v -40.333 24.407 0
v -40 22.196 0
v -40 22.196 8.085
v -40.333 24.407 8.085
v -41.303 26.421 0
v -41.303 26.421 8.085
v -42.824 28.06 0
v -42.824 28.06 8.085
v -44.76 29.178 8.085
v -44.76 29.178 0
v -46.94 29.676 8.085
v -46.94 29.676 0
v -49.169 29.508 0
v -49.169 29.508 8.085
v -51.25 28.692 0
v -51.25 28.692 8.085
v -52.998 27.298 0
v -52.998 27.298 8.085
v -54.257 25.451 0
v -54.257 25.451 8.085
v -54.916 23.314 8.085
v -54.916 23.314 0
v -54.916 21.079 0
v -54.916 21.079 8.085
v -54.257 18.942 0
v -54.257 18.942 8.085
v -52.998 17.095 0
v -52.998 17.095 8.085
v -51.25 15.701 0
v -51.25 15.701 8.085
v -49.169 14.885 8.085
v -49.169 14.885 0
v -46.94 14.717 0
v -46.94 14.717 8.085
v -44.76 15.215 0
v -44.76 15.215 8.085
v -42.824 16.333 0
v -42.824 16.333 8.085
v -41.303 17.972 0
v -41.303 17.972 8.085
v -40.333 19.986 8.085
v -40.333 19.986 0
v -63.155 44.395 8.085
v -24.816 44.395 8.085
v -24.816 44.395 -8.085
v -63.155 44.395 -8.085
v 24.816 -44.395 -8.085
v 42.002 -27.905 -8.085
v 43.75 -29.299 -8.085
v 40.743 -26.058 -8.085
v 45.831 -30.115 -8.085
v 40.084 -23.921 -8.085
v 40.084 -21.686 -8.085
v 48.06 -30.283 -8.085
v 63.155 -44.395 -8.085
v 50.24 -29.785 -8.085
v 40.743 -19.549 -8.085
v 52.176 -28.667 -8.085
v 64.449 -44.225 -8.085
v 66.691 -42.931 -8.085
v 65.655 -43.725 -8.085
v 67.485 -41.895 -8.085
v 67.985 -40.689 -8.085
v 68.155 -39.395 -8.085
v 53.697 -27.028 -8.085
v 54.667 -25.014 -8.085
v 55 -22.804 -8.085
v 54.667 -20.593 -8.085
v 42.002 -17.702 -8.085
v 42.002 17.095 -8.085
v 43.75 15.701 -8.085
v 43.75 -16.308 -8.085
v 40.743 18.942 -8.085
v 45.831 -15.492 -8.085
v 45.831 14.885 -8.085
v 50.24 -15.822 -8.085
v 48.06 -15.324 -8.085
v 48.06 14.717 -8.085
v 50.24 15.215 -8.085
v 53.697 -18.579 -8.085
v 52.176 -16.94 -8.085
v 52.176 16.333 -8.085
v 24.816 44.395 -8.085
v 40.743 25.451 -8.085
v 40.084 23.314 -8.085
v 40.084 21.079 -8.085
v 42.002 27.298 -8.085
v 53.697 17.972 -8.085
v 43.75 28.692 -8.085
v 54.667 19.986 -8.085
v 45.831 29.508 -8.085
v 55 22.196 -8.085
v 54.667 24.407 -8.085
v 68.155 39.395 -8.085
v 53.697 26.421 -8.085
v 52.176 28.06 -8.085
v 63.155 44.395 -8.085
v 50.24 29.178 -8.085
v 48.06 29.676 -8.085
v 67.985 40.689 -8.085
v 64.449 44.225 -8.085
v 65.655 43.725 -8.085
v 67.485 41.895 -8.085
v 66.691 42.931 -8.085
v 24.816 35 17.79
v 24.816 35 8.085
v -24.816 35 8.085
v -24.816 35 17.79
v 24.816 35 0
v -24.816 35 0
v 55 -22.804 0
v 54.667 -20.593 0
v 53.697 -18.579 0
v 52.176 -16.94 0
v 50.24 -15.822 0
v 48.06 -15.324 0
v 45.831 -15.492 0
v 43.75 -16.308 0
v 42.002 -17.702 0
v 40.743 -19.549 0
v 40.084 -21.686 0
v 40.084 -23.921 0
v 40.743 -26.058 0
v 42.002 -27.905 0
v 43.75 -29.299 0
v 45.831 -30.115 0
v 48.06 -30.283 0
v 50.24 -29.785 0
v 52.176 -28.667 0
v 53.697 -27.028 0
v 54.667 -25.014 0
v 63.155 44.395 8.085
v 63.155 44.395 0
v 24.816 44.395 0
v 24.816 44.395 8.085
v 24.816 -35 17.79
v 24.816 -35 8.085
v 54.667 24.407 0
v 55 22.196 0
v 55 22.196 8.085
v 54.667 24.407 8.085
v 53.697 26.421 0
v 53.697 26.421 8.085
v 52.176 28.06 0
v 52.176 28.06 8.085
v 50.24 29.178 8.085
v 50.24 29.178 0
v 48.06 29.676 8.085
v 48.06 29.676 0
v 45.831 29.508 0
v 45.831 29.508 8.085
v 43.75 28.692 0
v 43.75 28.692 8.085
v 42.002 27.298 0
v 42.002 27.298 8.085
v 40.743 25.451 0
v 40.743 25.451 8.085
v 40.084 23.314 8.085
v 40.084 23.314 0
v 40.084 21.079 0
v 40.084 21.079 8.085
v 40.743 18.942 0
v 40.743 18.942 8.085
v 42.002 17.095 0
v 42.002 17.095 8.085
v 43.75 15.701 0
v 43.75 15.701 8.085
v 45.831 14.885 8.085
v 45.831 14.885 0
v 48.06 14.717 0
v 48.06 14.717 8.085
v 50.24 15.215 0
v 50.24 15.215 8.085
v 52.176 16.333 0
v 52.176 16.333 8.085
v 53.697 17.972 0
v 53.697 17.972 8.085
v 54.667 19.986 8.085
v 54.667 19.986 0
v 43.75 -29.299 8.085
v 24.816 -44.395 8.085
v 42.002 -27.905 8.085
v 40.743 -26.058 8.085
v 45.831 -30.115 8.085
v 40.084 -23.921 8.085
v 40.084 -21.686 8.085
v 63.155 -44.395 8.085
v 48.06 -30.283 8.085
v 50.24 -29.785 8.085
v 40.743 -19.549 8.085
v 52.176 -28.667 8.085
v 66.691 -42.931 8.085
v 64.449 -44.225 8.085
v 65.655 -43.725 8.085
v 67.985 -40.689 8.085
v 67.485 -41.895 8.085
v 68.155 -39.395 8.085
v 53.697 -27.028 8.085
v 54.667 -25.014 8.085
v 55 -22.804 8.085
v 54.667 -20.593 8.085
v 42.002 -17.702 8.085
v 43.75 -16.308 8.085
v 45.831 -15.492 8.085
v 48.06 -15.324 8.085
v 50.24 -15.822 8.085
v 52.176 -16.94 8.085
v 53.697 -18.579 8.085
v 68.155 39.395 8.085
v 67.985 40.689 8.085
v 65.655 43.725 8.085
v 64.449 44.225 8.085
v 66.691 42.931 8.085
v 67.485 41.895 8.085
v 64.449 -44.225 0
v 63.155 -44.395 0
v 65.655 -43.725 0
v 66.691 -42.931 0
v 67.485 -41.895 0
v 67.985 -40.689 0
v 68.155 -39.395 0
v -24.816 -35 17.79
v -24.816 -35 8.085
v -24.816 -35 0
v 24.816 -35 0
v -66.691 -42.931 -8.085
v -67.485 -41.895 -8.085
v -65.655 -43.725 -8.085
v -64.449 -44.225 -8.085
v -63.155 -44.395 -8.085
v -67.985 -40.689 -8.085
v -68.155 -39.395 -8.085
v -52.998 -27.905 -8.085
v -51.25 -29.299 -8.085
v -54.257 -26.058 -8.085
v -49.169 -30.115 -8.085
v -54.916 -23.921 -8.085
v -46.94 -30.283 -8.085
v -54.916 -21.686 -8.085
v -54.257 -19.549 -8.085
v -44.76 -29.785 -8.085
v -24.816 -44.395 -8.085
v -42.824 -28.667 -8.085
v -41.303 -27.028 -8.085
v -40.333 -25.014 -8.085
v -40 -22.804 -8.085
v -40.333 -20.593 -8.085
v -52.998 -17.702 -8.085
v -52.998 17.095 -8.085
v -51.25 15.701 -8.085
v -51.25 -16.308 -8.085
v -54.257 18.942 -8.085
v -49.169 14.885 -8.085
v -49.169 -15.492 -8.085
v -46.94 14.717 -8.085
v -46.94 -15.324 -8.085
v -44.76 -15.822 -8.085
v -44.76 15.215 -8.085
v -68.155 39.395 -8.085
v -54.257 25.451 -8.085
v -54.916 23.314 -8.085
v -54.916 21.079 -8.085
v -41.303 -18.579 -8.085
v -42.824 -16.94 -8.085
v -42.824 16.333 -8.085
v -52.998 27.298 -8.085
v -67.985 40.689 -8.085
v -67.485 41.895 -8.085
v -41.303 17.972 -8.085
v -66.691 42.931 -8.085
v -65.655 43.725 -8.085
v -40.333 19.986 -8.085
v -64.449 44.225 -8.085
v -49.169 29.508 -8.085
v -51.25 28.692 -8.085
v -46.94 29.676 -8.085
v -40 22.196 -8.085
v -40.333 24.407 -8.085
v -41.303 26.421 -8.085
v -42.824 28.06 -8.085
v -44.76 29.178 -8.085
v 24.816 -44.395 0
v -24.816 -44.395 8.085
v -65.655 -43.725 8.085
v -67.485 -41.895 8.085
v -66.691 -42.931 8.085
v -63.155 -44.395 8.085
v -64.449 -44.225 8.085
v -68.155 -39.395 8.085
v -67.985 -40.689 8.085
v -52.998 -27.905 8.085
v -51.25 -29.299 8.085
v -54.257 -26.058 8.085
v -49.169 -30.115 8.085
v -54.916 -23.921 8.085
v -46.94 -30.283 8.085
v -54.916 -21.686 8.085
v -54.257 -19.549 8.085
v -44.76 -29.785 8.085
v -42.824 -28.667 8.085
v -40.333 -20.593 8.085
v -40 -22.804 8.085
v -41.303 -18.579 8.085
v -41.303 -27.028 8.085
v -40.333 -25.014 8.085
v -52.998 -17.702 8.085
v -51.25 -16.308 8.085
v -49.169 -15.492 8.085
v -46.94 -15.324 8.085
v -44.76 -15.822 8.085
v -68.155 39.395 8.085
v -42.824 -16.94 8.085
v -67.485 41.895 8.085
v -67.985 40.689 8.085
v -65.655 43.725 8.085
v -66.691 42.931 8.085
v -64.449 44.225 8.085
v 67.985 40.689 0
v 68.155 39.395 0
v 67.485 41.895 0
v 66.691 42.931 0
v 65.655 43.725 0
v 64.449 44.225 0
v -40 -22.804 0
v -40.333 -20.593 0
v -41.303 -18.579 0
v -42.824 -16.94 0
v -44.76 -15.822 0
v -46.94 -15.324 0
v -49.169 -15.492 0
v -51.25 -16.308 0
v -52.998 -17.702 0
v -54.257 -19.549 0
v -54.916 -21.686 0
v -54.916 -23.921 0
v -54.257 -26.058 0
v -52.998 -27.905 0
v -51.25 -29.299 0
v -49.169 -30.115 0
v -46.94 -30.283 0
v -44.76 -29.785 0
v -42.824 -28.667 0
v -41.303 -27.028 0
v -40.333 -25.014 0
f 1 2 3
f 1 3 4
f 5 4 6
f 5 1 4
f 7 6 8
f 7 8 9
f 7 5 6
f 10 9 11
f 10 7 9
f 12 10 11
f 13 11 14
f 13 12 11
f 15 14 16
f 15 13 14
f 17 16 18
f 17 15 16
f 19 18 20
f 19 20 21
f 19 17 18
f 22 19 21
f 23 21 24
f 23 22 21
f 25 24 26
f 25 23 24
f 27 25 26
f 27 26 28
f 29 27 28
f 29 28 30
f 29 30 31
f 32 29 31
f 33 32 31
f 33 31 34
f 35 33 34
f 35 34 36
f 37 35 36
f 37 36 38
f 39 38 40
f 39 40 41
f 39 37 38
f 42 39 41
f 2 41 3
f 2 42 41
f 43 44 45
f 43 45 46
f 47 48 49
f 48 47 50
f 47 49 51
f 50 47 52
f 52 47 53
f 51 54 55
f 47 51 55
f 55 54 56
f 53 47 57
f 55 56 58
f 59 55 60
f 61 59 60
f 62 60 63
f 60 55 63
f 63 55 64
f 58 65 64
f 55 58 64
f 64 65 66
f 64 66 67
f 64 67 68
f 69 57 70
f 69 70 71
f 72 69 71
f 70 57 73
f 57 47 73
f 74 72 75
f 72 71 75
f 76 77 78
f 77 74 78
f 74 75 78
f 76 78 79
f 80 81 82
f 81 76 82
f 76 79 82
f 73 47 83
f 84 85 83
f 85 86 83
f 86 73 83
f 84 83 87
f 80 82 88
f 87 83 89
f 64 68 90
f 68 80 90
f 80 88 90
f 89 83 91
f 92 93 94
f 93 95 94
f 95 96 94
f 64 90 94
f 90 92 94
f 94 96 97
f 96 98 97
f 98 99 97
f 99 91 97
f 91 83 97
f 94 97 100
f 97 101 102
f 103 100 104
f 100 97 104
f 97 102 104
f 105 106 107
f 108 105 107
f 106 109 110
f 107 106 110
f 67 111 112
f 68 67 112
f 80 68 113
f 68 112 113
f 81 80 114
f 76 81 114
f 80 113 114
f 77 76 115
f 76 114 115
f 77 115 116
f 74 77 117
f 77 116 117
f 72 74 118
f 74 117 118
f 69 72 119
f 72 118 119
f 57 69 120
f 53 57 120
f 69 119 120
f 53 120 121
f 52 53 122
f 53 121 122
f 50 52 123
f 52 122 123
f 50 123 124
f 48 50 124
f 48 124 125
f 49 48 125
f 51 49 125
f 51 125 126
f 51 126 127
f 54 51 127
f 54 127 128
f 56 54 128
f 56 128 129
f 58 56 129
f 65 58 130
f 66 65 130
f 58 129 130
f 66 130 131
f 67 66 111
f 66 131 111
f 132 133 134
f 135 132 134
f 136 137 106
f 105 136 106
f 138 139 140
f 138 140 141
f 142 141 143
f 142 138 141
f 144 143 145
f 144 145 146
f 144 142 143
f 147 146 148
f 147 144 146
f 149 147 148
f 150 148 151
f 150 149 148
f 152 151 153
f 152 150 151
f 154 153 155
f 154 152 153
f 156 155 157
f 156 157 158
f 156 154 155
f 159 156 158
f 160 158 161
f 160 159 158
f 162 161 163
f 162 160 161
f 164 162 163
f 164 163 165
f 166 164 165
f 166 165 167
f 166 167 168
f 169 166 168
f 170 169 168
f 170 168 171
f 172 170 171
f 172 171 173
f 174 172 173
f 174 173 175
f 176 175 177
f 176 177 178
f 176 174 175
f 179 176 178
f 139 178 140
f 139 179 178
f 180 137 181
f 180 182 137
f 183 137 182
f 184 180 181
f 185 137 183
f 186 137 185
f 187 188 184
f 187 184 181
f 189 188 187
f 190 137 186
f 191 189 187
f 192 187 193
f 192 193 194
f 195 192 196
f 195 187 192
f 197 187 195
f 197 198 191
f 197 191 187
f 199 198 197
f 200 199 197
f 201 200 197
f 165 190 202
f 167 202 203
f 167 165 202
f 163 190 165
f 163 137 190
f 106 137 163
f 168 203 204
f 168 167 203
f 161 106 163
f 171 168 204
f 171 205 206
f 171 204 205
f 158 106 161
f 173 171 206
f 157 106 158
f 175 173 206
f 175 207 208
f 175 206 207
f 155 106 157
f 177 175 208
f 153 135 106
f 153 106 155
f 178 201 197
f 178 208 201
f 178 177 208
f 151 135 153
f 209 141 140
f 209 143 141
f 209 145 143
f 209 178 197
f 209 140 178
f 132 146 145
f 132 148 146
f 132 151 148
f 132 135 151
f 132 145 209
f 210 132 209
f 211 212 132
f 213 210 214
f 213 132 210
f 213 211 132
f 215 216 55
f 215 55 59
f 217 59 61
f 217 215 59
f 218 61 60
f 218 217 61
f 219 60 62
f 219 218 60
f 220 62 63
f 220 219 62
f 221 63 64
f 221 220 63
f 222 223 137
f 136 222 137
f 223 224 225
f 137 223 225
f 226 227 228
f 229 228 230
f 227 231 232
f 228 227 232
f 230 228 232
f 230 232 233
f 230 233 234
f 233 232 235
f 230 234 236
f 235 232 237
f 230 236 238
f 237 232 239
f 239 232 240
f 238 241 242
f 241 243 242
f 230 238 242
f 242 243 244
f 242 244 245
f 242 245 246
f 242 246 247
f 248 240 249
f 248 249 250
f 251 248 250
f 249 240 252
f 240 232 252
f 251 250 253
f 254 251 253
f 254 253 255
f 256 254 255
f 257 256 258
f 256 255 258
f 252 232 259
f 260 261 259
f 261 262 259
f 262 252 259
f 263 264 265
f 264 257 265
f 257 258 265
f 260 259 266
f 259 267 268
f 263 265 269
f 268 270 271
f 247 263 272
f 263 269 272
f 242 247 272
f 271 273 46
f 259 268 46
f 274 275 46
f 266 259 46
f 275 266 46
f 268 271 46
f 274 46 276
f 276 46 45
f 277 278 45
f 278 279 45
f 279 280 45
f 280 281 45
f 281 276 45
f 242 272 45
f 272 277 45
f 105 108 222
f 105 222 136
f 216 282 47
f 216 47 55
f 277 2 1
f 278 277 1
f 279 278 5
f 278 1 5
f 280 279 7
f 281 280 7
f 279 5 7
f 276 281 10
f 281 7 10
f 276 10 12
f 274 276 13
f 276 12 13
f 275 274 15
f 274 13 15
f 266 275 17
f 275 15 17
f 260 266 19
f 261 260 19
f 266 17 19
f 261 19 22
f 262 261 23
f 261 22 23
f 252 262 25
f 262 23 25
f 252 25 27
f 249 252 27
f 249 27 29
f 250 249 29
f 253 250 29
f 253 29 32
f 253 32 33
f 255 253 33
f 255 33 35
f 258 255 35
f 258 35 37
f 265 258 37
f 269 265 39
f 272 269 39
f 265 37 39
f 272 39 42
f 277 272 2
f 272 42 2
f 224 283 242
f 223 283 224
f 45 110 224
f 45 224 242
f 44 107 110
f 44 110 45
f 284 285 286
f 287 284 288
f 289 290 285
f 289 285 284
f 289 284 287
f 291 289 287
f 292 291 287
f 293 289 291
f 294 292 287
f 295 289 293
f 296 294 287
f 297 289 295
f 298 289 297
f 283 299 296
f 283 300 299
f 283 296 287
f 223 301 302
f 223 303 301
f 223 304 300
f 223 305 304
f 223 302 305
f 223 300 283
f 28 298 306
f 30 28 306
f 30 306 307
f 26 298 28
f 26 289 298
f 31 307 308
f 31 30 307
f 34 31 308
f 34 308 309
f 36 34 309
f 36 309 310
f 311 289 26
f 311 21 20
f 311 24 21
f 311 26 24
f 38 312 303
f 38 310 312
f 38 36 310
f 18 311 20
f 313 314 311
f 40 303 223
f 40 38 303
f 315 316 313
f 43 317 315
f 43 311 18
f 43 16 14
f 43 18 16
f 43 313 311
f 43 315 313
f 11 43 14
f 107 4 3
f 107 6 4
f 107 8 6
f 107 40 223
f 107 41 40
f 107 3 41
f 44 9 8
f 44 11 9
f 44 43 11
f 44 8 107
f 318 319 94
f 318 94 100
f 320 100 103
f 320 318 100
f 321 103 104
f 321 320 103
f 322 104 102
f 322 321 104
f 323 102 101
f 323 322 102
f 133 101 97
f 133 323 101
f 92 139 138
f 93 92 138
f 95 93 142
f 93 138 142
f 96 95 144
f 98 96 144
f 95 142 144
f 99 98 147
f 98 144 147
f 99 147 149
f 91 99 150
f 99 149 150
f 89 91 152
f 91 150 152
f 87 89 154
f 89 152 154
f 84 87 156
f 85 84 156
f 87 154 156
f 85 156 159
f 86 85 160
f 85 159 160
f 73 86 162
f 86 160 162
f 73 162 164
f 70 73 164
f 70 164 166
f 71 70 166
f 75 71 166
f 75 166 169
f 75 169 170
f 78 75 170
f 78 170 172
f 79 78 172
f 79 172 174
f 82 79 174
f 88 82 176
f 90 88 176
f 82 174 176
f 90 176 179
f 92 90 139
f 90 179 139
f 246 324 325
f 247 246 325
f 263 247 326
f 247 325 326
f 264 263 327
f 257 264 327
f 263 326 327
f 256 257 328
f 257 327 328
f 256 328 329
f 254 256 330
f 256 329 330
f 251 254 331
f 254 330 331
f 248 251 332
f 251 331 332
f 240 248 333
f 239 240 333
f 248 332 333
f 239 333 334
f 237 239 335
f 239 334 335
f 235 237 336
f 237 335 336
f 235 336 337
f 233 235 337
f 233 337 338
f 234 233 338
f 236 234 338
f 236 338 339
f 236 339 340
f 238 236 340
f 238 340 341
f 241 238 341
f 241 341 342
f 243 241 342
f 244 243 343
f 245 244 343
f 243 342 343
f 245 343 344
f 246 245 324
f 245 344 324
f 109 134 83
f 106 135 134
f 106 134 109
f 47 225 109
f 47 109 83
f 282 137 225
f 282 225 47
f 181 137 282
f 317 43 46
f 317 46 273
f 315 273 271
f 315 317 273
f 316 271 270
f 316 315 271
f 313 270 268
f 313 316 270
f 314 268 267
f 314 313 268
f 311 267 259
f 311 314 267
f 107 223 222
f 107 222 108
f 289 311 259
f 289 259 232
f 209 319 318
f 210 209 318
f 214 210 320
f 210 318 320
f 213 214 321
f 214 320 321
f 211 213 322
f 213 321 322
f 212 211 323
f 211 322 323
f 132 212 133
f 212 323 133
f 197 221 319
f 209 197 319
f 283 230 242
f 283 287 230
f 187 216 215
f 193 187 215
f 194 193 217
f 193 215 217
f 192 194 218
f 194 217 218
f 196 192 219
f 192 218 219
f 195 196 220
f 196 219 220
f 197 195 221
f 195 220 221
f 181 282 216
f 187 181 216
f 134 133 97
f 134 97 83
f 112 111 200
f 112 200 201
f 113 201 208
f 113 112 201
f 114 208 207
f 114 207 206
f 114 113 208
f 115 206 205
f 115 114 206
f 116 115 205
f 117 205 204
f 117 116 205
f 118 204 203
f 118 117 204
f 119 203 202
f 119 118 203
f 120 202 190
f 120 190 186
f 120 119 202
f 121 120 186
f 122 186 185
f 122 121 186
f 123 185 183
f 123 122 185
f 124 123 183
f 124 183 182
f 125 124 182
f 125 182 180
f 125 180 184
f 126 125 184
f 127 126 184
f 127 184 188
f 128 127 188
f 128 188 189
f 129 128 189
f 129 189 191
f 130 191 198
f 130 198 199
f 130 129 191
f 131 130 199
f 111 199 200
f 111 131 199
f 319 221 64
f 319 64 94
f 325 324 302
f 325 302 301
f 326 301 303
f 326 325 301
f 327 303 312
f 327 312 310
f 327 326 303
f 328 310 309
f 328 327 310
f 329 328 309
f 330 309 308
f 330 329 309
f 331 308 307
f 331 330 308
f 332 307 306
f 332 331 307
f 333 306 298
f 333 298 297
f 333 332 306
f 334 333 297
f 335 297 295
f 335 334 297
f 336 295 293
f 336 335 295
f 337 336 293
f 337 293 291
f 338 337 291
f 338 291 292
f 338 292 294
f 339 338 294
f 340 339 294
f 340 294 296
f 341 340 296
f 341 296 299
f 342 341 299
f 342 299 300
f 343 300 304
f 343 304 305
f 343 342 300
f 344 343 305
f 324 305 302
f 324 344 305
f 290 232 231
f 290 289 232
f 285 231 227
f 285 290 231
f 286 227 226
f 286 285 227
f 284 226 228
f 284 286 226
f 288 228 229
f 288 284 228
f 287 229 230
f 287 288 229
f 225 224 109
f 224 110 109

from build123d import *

# Parameters (mm, degrees)
F0_W     = 24.8156127766
F0_H     = 70
F1_DEPTH = 17.79
F0_R     = 7.5
F2_DEPTH = 8.085
F3_DEPTH = 8.085


with BuildPart() as f1:
    # F0 (on Top) → F1 (new body)
    with BuildSketch(Plane.XY):
        with Locations((12.4078063883, 0)):
            Rectangle(F0_W, F0_H)
        with Locations((-12.4078063883, 0)):
            Rectangle(F0_W, F0_H)
    extrude(amount=F1_DEPTH)

    # F0 (on Top) → F2 (join)
    with BuildSketch(Plane.XY):
        with BuildLine():
            Line((24.8156127766, 35), (24.8156127766, -35))
            Line((24.8156127766, -35), (24.8156127766, -44.395))
            Line((24.8156127766, -44.395), (63.155, -44.395))
            ThreePointArc((63.155, -44.395), (66.6905339059, -42.9305339059), (68.155, -39.395))
            Line((68.155, -39.395), (68.155, 39.395))
            ThreePointArc((68.155, 39.395), (66.6905339059, 42.9305339059), (63.155, 44.395))
            Line((63.155, 44.395), (24.8156127766, 44.395))
            Line((24.8156127766, 44.395), (24.8156127766, 35))
        make_face()
        with Locations((47.5, -22.8035077453)):
            Circle(F0_R, mode=Mode.SUBTRACT)
        with Locations((47.5, 22.1964922547)):
            Circle(F0_R, mode=Mode.SUBTRACT)
        with BuildLine():
            Line((-24.8156127766, -44.395), (-24.8156127766, -35))
            Line((-24.8156127766, -35), (-24.8156127766, 35))
            Line((-24.8156127766, 35), (-24.8156127766, 44.395))
            Line((-24.8156127766, 44.395), (-63.155, 44.395))
            ThreePointArc((-63.155, 44.395), (-66.6905339059, 42.9305339059), (-68.155, 39.395))
            Line((-68.155, 39.395), (-68.155, -39.395))
            ThreePointArc((-68.155, -39.395), (-66.6905339059, -42.9305339059), (-63.155, -44.395))
            Line((-63.155, -44.395), (-24.8156127766, -44.395))
        make_face()
        with Locations((-47.5, -22.8035077453)):
            Circle(F0_R, mode=Mode.SUBTRACT)
        with Locations((-47.5, 22.1964922547)):
            Circle(F0_R, mode=Mode.SUBTRACT)
    extrude(amount=F2_DEPTH)

    # F0 (on Top) → F3 (join)
    with BuildSketch(Plane.XY):
        with BuildLine():
            Line((-24.8156127766, -44.395), (-24.8156127766, -35))
            Line((-24.8156127766, -35), (-24.8156127766, 35))
            Line((-24.8156127766, 35), (-24.8156127766, 44.395))
            Line((-24.8156127766, 44.395), (-63.155, 44.395))
            ThreePointArc((-63.155, 44.395), (-66.6905339059, 42.9305339059), (-68.155, 39.395))
            Line((-68.155, 39.395), (-68.155, -39.395))
            ThreePointArc((-68.155, -39.395), (-66.6905339059, -42.9305339059), (-63.155, -44.395))
            Line((-63.155, -44.395), (-24.8156127766, -44.395))
        make_face()
        with Locations((-47.5, -22.8035077453)):
            Circle(F0_R, mode=Mode.SUBTRACT)
        with Locations((-47.5, 22.1964922547)):
            Circle(F0_R, mode=Mode.SUBTRACT)
        with BuildLine():
            Line((24.8156127766, 35), (24.8156127766, -35))
            Line((24.8156127766, -35), (24.8156127766, -44.395))
            Line((24.8156127766, -44.395), (63.155, -44.395))
            ThreePointArc((63.155, -44.395), (66.6905339059, -42.9305339059), (68.155, -39.395))
            Line((68.155, -39.395), (68.155, 39.395))
            ThreePointArc((68.155, 39.395), (66.6905339059, 42.9305339059), (63.155, 44.395))
            Line((63.155, 44.395), (24.8156127766, 44.395))
            Line((24.8156127766, 44.395), (24.8156127766, 35))
        make_face()
        with Locations((47.5, -22.8035077453)):
            Circle(F0_R, mode=Mode.SUBTRACT)
        with Locations((47.5, 22.1964922547)):
            Circle(F0_R, mode=Mode.SUBTRACT)
    extrude(amount=-F3_DEPTH)


solid = f1.part
